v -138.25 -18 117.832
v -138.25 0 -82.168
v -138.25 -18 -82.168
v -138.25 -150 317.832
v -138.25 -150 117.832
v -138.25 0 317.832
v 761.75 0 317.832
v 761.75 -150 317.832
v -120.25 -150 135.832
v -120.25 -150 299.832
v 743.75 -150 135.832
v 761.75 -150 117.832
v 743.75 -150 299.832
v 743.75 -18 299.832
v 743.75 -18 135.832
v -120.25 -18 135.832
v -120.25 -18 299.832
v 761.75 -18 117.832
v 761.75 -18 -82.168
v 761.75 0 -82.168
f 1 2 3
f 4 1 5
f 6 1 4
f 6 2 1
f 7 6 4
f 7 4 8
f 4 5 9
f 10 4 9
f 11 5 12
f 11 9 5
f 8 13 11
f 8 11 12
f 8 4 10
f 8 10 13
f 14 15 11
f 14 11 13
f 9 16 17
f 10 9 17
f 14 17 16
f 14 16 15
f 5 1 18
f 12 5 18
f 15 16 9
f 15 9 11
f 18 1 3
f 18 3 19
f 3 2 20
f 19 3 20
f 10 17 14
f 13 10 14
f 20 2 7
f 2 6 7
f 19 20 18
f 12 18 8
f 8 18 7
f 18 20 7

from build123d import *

# Parameters (mm, degrees)
F0_W     = 900
F0_H     = 200
F0_W_2   = 864
F0_H_2   = 164
F1_DEPTH = 150
F2_DEPTH = 18
F3_DEPTH = 18


with BuildPart() as f1:
    # F0 (on Front) → F1 (new body)
    with BuildSketch(Plane.XZ):
        with Locations((311.750185, 217.832059)):
            Rectangle(F0_W, F0_H)
        with Locations((311.750185, 217.832059)):
            Rectangle(F0_W_2, F0_H_2, mode=Mode.SUBTRACT)
    extrude(amount=F1_DEPTH)

    # F0 (on Front) → F2 (join)
    with BuildSketch(Plane.XZ):
        with Locations((311.750185, 17.832059)):
            Rectangle(F0_W, F0_H)
    extrude(amount=F2_DEPTH)

    # F0 (on Front) → F3 (join)
    with BuildSketch(Plane.XZ):
        with Locations((311.750185, 217.832059)):
            Rectangle(F0_W_2, F0_H_2)
    extrude(amount=F3_DEPTH)


solid = f1.part
